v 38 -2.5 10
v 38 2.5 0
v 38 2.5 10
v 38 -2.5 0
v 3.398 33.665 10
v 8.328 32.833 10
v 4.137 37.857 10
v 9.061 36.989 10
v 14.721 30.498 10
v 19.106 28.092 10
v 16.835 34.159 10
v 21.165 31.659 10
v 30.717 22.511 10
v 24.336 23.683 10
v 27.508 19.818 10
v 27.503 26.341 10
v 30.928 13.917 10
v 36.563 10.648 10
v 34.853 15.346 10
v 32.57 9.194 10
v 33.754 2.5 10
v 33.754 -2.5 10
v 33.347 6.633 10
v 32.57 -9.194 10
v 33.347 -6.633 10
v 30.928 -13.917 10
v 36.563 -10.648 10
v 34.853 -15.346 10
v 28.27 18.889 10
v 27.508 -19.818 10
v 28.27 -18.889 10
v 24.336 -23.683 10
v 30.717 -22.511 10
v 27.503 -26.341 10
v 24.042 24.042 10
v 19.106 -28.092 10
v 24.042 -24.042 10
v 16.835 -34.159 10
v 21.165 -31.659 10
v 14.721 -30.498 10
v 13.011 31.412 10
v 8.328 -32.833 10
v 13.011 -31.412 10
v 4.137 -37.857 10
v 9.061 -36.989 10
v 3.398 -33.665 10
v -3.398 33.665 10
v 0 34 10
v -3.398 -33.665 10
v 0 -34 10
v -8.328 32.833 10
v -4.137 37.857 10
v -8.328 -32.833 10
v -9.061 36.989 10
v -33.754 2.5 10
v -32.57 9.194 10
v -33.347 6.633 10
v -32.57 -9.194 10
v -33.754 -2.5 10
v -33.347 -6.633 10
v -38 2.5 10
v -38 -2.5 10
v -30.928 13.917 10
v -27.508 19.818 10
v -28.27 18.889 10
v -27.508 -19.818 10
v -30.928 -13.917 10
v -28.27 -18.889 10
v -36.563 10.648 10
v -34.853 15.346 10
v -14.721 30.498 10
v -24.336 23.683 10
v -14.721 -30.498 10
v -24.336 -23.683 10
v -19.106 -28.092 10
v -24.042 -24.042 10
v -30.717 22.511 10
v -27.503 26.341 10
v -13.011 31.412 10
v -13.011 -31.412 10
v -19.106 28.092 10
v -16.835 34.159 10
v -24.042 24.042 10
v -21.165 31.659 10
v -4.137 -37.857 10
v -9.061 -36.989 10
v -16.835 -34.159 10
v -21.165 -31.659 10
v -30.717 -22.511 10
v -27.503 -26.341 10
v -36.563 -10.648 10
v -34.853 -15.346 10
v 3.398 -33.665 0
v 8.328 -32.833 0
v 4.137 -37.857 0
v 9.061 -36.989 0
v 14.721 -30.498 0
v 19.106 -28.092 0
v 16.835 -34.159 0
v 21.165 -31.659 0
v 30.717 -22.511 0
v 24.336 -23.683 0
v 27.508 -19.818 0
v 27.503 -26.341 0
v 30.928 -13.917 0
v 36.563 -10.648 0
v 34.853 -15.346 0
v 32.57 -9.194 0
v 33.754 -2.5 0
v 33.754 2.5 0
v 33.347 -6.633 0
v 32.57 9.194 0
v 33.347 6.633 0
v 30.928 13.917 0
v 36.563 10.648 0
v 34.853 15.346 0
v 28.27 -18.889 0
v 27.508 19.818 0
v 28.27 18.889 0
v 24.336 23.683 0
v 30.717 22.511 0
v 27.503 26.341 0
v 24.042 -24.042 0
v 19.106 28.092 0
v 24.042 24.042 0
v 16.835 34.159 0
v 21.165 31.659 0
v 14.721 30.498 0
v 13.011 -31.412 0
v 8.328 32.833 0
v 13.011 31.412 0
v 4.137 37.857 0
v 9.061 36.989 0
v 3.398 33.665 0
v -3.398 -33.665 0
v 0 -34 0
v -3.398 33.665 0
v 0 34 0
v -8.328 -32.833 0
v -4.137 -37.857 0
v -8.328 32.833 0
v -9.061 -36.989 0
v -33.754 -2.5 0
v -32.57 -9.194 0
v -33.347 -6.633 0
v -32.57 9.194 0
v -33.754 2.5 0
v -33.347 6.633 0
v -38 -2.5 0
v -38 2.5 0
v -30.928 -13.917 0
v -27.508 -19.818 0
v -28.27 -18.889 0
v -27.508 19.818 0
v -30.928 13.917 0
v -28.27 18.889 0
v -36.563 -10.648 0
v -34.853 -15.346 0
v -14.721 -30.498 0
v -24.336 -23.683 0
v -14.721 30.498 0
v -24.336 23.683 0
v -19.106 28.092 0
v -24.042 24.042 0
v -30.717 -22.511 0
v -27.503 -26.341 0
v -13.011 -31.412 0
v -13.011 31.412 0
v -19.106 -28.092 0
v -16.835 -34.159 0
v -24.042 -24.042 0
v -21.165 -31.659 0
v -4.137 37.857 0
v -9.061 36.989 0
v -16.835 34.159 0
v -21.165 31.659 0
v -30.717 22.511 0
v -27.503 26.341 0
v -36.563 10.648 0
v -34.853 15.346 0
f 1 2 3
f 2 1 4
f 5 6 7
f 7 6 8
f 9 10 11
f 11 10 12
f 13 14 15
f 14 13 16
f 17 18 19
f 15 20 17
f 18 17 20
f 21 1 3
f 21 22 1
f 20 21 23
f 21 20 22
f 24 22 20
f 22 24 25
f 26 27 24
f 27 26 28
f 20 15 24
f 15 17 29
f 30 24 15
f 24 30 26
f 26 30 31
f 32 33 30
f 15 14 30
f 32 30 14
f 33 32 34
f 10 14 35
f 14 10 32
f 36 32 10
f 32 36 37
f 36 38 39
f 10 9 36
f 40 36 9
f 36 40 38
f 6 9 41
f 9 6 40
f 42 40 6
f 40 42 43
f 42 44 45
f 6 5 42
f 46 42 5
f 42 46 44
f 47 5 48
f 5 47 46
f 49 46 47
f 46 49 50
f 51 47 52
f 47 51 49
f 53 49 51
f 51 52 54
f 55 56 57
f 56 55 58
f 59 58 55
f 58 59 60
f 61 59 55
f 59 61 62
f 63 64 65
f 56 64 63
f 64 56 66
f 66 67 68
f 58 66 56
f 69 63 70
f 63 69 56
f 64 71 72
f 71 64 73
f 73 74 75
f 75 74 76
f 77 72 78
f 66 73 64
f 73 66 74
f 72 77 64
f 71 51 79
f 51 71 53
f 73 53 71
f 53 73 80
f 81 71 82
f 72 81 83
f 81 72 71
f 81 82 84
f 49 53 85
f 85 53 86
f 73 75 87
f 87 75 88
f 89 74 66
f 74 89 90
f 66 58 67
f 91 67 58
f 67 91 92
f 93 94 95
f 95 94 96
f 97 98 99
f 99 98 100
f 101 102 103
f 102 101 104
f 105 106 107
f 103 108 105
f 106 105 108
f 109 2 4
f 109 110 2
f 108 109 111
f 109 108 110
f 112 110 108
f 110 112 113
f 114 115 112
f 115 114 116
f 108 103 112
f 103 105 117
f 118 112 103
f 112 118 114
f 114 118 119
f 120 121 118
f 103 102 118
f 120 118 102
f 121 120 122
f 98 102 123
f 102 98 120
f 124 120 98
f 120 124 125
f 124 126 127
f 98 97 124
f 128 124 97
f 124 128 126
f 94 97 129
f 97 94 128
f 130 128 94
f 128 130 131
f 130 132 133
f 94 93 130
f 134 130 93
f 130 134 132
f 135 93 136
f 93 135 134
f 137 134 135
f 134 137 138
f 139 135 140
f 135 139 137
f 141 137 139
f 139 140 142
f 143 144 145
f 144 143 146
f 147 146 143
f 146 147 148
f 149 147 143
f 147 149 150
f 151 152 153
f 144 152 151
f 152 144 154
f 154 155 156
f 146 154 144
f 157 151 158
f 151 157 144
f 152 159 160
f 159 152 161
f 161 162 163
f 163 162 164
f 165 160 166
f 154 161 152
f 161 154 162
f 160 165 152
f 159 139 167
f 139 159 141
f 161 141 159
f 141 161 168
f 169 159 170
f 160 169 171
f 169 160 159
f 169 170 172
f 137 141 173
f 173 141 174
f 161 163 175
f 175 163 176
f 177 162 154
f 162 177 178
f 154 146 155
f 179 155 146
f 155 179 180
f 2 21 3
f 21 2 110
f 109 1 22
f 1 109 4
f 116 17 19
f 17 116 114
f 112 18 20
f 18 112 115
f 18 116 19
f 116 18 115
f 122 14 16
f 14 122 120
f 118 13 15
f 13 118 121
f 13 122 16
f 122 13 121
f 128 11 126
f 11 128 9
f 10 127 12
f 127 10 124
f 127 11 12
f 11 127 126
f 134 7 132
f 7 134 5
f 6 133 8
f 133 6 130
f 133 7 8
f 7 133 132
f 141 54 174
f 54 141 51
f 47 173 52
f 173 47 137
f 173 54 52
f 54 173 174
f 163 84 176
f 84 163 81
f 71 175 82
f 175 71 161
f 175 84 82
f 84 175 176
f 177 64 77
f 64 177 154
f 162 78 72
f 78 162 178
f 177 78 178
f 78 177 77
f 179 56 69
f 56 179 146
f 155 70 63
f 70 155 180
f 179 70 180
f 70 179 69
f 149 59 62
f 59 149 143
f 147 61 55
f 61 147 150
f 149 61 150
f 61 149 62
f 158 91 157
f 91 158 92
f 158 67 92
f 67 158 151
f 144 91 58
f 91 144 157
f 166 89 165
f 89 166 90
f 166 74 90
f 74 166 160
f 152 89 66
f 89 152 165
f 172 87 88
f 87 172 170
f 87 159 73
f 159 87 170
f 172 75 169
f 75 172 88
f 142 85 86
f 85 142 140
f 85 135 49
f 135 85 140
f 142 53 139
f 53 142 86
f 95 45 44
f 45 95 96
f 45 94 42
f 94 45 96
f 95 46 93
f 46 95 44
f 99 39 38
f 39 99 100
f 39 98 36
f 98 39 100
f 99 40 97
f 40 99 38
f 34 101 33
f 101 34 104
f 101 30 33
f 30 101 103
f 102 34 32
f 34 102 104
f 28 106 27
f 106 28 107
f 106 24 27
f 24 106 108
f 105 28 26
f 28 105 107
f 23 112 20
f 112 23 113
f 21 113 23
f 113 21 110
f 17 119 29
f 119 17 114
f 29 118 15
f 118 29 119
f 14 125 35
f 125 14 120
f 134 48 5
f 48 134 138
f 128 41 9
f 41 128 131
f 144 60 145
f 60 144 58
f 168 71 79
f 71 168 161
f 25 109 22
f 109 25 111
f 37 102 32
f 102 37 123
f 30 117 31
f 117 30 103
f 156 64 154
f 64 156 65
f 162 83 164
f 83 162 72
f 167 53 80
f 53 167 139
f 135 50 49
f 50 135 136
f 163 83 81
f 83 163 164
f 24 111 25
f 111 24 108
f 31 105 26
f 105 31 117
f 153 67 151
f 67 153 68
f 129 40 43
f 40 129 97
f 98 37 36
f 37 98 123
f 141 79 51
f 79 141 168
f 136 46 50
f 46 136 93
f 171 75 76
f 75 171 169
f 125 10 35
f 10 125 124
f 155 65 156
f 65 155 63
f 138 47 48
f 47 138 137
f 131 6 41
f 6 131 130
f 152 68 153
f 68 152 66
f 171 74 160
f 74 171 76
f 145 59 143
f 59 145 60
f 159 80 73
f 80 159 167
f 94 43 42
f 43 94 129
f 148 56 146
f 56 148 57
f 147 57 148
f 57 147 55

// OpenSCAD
$fn = 32;

// ----------------------------------------------------------------------
// Spur blank: plain gear blank
// ----------------------------------------------------------------------

// --- parameters (mm) ---
disc_r = 34;              // blank root radius
disc_t = 10;              // blank thickness
n_teeth = 18;             // stub tooth count
tooth_w = 5;              // tooth width at the root
tooth_h = 4;              // tooth height above the root

out_r = disc_r + tooth_h;  // tip radius
bbox_x = 76.0;  // measured width over the teeth
bbox_y = 75.71;  // measured depth over the teeth

union() {
  cylinder(r = disc_r, h = disc_t);
  for (i = [0 : n_teeth - 1])
    rotate([0, 0, i * 360 / n_teeth])
      translate([disc_r - 1, -tooth_w / 2, 0])
        cube([tooth_h + 1, tooth_w, disc_t]);
}
